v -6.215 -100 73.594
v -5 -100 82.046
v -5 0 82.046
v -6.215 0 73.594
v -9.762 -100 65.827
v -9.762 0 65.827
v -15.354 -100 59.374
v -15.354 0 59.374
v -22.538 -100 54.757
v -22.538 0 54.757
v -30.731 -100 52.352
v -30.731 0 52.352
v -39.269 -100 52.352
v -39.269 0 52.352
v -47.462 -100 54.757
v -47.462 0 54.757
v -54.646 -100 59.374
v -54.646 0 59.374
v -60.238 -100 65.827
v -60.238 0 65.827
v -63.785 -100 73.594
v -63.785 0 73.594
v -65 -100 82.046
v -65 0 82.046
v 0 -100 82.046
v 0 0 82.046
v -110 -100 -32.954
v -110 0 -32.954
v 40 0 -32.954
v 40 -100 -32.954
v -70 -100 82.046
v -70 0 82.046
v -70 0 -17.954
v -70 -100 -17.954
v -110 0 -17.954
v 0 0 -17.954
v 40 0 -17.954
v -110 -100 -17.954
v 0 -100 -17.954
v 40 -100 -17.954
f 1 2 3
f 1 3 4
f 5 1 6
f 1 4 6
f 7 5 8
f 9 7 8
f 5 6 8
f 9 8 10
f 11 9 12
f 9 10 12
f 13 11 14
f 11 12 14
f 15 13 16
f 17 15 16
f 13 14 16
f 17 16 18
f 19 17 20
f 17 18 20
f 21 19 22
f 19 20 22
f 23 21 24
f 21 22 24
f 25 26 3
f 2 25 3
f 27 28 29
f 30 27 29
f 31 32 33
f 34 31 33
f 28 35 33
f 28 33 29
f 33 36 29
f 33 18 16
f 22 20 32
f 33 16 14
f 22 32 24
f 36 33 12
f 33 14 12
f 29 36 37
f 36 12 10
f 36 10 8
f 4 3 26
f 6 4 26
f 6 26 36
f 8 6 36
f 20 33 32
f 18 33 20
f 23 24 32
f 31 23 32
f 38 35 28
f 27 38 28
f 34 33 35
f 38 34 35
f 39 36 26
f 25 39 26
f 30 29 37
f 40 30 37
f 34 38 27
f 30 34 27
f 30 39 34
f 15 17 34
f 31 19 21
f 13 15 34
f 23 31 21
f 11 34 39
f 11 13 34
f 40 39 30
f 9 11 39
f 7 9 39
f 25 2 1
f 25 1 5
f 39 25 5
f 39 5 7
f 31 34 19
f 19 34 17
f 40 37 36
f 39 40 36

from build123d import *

# Parameters (mm, degrees)
F1_DEPTH = 100


with BuildPart() as f1:
    # F0 (on Front) → F1 (new body)
    with BuildSketch(Plane.XZ):
        Polygon((-70, -17.953758), (-110, -17.953758), (-110, -32.953758), (40, -32.953758), (40, -17.953758), (0, -17.953758), align=None)
        with BuildLine():
            Line((-70, 82.046242), (-70, -17.953758))
            Line((-70, -17.953758), (0, -17.953758))
            Line((0, -17.953758), (0, 82.046242))
            Line((0, 82.046242), (-5, 82.046242))
            ThreePointArc((-5, 82.046242), (-35, 52.046242), (-65, 82.046242))
            Line((-65, 82.046242), (-70, 82.046242))
        make_face()
    extrude(amount=F1_DEPTH)


solid = f1.part
